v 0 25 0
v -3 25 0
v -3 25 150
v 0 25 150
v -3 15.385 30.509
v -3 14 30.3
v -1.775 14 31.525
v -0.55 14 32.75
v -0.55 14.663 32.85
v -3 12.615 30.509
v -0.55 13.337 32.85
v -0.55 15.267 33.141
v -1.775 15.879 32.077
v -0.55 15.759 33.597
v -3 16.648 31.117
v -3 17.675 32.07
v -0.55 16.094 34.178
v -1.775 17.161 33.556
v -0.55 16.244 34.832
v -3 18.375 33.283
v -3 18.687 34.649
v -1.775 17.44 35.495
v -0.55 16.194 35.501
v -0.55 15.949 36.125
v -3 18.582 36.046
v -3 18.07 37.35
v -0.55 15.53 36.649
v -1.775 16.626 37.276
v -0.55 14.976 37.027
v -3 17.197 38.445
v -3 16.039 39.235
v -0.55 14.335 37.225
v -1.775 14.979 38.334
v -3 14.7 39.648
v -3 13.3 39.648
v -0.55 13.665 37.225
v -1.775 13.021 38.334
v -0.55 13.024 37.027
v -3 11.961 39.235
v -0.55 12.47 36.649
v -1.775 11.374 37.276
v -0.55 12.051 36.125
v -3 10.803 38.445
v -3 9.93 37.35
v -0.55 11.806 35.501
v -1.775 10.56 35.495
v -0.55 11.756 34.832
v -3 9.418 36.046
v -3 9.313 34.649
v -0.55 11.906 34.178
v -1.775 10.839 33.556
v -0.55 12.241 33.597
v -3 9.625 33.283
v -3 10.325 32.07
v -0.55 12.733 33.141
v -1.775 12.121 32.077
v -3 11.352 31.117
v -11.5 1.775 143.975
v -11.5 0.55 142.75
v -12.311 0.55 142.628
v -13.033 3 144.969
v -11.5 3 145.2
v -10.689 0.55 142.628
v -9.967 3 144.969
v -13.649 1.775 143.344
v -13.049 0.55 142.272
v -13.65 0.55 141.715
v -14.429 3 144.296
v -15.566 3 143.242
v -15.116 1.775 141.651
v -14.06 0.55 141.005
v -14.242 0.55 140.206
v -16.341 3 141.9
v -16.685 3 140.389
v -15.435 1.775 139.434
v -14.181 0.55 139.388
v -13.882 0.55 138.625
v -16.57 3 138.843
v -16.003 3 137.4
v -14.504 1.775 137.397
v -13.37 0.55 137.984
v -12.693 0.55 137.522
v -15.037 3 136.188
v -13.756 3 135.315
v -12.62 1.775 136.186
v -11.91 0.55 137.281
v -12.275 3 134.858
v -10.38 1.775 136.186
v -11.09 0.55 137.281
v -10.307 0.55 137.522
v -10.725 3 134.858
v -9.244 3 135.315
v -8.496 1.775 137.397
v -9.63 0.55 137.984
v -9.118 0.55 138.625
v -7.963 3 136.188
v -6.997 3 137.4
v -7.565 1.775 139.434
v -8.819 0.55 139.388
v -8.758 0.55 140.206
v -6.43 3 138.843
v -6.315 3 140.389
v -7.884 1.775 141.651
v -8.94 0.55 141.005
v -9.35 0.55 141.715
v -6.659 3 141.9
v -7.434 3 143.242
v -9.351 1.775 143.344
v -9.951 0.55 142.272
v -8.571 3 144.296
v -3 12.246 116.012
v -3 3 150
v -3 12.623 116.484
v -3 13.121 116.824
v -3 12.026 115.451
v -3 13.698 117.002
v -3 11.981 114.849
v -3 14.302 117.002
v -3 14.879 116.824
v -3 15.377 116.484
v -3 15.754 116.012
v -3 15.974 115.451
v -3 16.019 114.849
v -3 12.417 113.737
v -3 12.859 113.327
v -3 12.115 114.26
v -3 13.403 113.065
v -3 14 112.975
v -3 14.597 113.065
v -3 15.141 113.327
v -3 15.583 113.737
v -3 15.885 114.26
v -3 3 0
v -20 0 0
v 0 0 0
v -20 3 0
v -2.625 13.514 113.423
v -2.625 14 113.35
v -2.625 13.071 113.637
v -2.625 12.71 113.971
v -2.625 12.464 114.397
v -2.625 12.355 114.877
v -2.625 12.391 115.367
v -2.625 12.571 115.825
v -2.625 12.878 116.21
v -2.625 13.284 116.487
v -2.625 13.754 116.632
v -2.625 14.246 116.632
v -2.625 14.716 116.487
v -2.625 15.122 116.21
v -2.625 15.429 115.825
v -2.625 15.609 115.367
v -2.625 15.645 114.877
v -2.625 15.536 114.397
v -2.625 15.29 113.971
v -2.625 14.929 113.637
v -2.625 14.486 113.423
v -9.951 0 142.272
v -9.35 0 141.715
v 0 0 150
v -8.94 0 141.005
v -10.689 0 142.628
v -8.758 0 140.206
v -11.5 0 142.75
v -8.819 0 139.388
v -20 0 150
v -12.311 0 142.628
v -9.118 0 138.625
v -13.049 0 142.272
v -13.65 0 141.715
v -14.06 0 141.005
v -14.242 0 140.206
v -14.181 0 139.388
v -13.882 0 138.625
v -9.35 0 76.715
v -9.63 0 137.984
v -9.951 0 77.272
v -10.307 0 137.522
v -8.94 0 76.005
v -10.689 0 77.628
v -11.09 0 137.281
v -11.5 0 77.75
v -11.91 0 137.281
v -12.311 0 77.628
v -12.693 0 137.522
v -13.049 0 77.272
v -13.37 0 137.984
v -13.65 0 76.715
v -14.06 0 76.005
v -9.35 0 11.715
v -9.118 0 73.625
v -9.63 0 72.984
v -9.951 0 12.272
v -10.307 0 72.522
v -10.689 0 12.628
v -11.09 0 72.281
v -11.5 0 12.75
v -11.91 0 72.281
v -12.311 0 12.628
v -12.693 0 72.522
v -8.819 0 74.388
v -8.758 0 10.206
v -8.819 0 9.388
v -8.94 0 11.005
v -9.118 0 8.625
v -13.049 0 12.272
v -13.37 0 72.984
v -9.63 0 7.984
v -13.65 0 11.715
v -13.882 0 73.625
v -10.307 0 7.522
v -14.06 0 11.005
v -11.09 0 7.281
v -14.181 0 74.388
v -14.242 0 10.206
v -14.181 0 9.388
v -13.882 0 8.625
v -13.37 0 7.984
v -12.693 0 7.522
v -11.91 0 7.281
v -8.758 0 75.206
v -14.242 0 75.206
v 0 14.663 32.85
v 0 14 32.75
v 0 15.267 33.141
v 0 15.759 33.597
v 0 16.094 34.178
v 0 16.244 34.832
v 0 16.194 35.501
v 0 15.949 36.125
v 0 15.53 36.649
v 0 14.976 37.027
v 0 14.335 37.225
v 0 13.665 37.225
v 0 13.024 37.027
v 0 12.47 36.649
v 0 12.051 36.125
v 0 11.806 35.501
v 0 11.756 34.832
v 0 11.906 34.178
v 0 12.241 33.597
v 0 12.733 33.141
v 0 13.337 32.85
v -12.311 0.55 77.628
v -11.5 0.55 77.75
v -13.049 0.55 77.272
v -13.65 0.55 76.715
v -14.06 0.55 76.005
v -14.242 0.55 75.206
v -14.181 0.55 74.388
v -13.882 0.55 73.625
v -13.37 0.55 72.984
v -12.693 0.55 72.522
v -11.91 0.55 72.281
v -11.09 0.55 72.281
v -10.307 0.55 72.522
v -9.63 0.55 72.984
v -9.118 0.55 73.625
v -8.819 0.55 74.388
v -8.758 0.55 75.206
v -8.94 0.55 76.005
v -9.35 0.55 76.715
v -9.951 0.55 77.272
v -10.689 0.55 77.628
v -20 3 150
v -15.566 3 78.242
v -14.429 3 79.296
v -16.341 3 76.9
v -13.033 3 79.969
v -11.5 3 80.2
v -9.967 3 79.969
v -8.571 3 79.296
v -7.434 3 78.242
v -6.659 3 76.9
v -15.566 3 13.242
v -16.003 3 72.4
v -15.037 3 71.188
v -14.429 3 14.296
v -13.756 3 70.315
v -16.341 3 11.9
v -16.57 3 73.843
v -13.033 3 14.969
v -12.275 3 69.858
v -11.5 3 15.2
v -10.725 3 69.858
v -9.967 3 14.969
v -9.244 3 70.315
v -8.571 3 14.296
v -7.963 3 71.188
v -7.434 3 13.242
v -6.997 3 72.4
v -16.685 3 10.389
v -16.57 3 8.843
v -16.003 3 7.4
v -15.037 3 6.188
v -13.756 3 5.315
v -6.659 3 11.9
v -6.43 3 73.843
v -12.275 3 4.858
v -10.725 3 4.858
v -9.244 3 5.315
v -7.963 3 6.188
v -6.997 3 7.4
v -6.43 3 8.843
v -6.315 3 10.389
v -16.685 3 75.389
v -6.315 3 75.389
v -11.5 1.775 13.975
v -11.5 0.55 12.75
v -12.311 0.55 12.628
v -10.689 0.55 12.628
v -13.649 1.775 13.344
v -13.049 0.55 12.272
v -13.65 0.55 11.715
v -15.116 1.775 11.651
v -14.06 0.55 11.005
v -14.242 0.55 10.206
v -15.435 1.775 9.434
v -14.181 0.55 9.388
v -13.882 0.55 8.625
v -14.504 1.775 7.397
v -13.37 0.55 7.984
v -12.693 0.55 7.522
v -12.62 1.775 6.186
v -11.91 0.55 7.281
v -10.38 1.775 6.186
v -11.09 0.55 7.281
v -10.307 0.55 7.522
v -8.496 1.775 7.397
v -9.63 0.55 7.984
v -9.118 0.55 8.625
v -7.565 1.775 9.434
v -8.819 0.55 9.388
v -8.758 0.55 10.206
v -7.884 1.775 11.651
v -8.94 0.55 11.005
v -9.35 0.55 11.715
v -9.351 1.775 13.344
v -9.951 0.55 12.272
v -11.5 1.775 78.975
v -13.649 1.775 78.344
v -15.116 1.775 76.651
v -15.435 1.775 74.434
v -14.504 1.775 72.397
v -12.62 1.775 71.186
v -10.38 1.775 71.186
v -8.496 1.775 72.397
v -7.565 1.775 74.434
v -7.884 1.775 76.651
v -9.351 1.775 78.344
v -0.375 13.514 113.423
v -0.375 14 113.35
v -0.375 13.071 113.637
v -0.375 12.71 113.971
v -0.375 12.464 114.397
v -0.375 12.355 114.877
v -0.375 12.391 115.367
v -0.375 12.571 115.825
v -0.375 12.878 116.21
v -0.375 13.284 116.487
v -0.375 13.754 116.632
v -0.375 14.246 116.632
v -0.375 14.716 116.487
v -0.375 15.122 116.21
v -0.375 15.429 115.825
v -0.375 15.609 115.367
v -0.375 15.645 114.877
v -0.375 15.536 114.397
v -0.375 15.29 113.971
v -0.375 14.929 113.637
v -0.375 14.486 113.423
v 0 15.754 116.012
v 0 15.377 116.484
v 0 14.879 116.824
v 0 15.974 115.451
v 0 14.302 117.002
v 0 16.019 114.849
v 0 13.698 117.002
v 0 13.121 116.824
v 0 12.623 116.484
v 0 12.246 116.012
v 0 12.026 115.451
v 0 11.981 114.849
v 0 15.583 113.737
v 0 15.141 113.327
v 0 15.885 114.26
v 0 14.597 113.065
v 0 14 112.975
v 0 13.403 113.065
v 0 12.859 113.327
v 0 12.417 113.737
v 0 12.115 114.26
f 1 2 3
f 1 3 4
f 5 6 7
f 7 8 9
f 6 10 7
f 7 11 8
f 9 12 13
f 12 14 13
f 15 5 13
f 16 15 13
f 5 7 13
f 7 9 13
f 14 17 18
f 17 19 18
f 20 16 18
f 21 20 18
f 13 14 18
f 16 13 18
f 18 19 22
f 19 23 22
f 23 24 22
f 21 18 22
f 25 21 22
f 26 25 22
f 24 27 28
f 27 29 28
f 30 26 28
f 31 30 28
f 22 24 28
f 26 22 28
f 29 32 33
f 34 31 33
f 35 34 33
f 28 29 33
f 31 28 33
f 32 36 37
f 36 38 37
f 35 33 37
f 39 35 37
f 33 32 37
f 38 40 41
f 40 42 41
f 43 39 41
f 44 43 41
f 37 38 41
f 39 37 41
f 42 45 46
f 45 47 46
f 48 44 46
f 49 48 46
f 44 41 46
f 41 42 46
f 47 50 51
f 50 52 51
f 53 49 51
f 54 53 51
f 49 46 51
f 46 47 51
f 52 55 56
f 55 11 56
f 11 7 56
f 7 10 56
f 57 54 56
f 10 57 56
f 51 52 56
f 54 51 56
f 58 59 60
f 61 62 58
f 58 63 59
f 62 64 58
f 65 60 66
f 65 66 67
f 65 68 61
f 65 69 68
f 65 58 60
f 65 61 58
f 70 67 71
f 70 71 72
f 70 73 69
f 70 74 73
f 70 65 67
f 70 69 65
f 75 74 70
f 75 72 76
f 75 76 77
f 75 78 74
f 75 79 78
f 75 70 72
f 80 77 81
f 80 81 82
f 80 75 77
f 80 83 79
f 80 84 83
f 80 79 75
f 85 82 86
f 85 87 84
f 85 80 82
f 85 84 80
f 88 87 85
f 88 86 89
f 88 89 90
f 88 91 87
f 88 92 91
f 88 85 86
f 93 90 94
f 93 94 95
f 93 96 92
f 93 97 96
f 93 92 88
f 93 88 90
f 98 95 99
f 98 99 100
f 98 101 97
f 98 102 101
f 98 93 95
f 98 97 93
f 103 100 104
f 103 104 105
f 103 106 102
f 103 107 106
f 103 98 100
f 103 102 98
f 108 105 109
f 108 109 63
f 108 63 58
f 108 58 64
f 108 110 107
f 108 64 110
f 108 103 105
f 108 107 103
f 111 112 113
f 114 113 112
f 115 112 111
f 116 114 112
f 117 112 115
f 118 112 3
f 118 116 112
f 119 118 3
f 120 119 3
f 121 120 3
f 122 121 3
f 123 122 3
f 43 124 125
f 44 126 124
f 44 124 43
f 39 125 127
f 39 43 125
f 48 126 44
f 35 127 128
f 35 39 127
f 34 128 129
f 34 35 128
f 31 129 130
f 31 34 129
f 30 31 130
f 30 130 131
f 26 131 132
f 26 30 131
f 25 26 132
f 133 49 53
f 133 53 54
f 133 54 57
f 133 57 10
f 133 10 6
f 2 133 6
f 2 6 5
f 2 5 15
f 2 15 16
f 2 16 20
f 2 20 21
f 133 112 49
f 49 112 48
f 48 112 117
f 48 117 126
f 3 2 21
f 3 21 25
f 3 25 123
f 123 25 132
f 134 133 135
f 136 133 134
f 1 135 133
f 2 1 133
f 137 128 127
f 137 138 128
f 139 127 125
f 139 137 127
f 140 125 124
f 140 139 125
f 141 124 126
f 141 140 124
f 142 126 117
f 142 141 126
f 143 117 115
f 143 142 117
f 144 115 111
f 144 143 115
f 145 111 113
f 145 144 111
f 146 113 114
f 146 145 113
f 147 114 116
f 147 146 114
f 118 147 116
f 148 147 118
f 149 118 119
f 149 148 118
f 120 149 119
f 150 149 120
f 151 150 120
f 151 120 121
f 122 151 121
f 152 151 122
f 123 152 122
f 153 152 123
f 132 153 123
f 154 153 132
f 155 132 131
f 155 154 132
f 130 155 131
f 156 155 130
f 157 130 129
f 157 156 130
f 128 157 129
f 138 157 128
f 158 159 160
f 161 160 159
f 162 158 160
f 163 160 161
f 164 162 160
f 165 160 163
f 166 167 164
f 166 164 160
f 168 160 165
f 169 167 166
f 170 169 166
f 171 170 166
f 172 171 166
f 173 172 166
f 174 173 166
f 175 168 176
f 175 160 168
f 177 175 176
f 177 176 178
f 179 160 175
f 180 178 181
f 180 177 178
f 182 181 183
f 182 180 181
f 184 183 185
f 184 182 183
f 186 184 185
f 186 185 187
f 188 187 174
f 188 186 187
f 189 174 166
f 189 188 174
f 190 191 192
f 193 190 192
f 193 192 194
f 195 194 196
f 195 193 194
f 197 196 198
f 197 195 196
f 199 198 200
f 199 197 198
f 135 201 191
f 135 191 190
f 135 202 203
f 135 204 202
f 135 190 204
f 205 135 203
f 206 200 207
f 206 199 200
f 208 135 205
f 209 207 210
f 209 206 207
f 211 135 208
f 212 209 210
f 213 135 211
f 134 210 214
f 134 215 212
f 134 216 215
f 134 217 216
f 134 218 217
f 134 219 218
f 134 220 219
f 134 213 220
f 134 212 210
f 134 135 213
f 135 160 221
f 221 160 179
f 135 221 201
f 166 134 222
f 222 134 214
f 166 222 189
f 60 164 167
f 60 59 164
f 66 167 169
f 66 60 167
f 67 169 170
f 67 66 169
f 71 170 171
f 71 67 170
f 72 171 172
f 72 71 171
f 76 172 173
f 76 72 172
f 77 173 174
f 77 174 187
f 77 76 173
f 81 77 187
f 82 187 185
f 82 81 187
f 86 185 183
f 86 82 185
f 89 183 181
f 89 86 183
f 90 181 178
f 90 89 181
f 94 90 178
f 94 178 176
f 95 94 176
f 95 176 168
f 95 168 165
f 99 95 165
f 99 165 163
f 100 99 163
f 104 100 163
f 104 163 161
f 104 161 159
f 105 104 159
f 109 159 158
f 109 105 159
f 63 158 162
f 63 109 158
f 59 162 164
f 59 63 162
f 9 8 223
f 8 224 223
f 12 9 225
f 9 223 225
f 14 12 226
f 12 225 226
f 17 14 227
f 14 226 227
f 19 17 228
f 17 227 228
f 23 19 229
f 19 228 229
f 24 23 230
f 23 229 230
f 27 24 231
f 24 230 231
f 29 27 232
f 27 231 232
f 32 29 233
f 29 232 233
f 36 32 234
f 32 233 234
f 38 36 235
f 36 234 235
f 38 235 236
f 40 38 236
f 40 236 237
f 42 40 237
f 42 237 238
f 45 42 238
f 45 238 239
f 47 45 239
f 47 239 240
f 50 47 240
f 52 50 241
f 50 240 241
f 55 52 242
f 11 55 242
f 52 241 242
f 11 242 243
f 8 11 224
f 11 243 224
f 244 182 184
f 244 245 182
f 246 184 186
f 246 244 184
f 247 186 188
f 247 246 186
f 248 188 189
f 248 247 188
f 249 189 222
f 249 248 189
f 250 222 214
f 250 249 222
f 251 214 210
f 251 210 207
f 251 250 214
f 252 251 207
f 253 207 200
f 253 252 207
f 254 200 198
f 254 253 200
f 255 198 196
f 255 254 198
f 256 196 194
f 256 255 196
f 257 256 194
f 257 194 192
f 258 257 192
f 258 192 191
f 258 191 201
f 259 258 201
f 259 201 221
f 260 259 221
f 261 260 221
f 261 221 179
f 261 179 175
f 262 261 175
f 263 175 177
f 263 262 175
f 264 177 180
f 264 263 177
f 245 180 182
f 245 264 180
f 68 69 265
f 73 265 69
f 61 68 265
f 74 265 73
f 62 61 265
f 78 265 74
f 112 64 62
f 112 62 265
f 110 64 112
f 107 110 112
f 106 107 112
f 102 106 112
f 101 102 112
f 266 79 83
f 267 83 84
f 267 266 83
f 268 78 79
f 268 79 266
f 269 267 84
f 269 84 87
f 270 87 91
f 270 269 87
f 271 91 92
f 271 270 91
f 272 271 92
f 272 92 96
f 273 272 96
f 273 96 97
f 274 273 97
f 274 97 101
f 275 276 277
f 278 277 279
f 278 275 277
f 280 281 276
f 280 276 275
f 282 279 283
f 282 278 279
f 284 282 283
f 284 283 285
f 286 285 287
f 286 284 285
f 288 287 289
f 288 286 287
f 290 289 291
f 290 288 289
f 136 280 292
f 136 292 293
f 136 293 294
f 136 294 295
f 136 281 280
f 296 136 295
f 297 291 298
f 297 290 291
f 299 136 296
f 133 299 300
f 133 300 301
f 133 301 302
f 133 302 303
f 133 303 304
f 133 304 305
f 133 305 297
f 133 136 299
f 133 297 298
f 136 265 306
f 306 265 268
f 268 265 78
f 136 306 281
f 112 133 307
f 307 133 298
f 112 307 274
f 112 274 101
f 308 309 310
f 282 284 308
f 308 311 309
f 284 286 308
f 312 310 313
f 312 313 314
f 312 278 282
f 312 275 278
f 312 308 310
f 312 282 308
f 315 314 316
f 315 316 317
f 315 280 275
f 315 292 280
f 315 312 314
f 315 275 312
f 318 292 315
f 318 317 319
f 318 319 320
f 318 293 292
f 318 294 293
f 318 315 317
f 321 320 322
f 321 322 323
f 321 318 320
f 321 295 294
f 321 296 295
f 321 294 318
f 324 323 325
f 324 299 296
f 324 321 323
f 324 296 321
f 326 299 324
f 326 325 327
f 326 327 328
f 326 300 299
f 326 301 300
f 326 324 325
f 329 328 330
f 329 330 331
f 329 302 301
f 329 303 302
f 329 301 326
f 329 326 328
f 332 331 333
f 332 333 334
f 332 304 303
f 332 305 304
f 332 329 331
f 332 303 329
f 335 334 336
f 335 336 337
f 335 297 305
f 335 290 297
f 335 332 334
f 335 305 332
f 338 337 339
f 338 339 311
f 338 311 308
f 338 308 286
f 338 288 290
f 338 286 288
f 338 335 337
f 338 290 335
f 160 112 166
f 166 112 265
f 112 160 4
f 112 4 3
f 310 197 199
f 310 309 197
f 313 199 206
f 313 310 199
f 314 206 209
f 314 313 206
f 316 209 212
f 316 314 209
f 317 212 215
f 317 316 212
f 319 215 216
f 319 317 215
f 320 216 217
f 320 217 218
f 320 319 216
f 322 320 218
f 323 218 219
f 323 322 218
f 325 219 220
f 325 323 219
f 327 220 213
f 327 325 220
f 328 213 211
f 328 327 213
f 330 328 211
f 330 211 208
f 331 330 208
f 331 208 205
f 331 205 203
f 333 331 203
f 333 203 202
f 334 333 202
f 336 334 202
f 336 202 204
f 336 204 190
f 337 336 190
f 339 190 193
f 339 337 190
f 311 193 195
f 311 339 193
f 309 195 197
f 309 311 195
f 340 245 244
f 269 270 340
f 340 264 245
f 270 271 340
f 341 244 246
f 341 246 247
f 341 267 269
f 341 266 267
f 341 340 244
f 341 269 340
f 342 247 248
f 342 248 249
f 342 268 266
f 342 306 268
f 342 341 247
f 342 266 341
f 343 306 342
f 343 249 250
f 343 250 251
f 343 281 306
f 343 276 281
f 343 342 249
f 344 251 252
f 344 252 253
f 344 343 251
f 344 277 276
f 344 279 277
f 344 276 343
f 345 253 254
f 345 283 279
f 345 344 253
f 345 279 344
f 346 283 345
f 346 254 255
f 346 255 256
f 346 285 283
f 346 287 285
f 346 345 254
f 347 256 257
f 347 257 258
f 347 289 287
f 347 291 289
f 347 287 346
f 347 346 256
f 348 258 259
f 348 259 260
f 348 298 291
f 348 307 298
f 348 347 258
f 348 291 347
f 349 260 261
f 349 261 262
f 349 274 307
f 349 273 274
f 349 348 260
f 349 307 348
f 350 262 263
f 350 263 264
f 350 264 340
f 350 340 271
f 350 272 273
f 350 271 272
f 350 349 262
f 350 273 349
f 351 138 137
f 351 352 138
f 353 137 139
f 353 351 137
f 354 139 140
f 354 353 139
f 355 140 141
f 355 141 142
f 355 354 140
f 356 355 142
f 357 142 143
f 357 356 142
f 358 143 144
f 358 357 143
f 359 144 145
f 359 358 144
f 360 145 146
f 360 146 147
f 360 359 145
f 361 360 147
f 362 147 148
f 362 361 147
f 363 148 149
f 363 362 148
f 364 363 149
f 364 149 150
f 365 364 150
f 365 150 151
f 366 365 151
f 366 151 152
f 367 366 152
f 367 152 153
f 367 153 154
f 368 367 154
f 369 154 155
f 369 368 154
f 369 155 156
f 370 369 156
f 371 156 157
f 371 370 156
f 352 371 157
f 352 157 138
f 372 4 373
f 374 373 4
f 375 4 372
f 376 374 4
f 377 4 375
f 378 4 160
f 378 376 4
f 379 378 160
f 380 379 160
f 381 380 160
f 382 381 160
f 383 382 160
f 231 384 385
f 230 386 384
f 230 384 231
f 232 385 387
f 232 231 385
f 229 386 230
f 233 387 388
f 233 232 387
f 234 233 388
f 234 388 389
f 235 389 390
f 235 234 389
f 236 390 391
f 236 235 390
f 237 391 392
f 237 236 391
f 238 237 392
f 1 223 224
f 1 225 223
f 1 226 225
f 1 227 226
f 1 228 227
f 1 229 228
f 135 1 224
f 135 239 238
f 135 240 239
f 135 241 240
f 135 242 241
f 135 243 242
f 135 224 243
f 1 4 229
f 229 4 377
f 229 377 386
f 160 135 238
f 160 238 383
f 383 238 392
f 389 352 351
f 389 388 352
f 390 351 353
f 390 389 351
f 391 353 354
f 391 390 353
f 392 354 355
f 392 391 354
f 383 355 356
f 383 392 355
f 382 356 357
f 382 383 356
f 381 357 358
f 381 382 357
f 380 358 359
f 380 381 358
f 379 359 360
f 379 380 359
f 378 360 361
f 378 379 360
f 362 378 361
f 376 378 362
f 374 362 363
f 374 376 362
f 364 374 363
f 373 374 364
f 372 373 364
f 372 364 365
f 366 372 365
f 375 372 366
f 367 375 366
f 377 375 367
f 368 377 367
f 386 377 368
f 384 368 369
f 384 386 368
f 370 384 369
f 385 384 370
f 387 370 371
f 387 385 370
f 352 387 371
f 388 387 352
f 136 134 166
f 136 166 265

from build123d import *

# Parameters (mm, degrees)
BOSS_EXTRU_1_DEPTH                             = 150
FRAISAGE_POUR_VIS_T_TE_FRAIS_E_M41_D           = 4.5
FRAISAGE_POUR_VIS_T_TE_FRAIS_E_M41_DEPTH       = 25
FRAISAGE_POUR_VIS_T_TE_FRAIS_E_M41_CSINK_D     = 9.4
FRAISAGE_POUR_VIS_T_TE_FRAIS_E_M41_CSINK_ANGLE = 90
FRAISAGE_POUR_VIS_T_TE_FRAIS_E_M41_TIP         = 1.351936393
FRAISAGE_POUR_VIS_T_TE_FRAIS_E_M52_AT_COUNT    = 2
FRAISAGE_POUR_VIS_T_TE_FRAIS_E_M52_AT_PITCH    = 65
FRAISAGE_POUR_VIS_T_TE_FRAIS_E_M52_2_COUNT     = 2
FRAISAGE_POUR_VIS_T_TE_FRAIS_E_M52_2_PITCH     = 65


with BuildPart() as part:
    # Esquisse1 → Boss.-Extru.1 (new body)
    with BuildSketch(Plane.XY):
        Polygon((0, 25), (0, 0), (-20, 0), (-20, 3), (-3, 3), (-3, 25), align=None)
    extrude(amount=BOSS_EXTRU_1_DEPTH)

    # Fraisage pour vis à tête fraisée M41
    with Locations(Plane.ZY.offset(3)):
        with Locations((35, 14)):
            CounterSinkHole(FRAISAGE_POUR_VIS_T_TE_FRAIS_E_M41_D / 2, FRAISAGE_POUR_VIS_T_TE_FRAIS_E_M41_CSINK_D / 2, depth=FRAISAGE_POUR_VIS_T_TE_FRAIS_E_M41_DEPTH, counter_sink_angle=FRAISAGE_POUR_VIS_T_TE_FRAIS_E_M41_CSINK_ANGLE)
            with Locations((0, 0, -(FRAISAGE_POUR_VIS_T_TE_FRAIS_E_M41_DEPTH + FRAISAGE_POUR_VIS_T_TE_FRAIS_E_M41_TIP / 2))):  # 118° drill point
                Cone(0, FRAISAGE_POUR_VIS_T_TE_FRAIS_E_M41_D / 2, FRAISAGE_POUR_VIS_T_TE_FRAIS_E_M41_TIP, mode=Mode.SUBTRACT)

    # Esquisse6 → Trou taraudé M51 (revolve, cut)
    with BuildSketch(Plane(origin=(0, 14, 115), x_dir=(0, 0, -1), z_dir=(0, 1, 0))):
        Polygon((0, 0), (0, 3), (2.025, 3), (1.65, 2.625), (1.65, 0.375), (2.025, 0), align=None)
    revolve(axis=Axis((6.35, 14, 115), (-1, 0, 0)), mode=Mode.SUBTRACT)

    # Esquisse8 → Fraisage pour vis à tête fraisée M52 (revolve, cut)
    with BuildSketch(Plane(origin=(-11.5, 3, 75), x_dir=(0, 0, 1), z_dir=(1, 0, 0))):
        Polygon((0, 0), (0, 3), (2.75, 3), (2.75, 2.45), (5.2, 0), align=None)
    fraisage_pour_vis_t_te_frais_e_m52 = revolve(axis=Axis((-11.5, 9.35, 75), (0, -1, 0)), mode=Mode.SUBTRACT)

    # Fraisage pour vis à tête fraisée M52 at: Fraisage pour vis à tête fraisée M52 ×2
    with Locations(*[(0, 0, i * FRAISAGE_POUR_VIS_T_TE_FRAIS_E_M52_AT_PITCH) for i in range(1, FRAISAGE_POUR_VIS_T_TE_FRAIS_E_M52_AT_COUNT)]):
        add(fraisage_pour_vis_t_te_frais_e_m52, mode=Mode.SUBTRACT)

    # Fraisage pour vis _ t_te frais_e M52 2: Fraisage pour vis à tête fraisée M52 ×2
    with Locations(*[(0, 0, -i * FRAISAGE_POUR_VIS_T_TE_FRAIS_E_M52_2_PITCH) for i in range(1, FRAISAGE_POUR_VIS_T_TE_FRAIS_E_M52_2_COUNT)]):
        add(fraisage_pour_vis_t_te_frais_e_m52, mode=Mode.SUBTRACT)


solid = part.part
